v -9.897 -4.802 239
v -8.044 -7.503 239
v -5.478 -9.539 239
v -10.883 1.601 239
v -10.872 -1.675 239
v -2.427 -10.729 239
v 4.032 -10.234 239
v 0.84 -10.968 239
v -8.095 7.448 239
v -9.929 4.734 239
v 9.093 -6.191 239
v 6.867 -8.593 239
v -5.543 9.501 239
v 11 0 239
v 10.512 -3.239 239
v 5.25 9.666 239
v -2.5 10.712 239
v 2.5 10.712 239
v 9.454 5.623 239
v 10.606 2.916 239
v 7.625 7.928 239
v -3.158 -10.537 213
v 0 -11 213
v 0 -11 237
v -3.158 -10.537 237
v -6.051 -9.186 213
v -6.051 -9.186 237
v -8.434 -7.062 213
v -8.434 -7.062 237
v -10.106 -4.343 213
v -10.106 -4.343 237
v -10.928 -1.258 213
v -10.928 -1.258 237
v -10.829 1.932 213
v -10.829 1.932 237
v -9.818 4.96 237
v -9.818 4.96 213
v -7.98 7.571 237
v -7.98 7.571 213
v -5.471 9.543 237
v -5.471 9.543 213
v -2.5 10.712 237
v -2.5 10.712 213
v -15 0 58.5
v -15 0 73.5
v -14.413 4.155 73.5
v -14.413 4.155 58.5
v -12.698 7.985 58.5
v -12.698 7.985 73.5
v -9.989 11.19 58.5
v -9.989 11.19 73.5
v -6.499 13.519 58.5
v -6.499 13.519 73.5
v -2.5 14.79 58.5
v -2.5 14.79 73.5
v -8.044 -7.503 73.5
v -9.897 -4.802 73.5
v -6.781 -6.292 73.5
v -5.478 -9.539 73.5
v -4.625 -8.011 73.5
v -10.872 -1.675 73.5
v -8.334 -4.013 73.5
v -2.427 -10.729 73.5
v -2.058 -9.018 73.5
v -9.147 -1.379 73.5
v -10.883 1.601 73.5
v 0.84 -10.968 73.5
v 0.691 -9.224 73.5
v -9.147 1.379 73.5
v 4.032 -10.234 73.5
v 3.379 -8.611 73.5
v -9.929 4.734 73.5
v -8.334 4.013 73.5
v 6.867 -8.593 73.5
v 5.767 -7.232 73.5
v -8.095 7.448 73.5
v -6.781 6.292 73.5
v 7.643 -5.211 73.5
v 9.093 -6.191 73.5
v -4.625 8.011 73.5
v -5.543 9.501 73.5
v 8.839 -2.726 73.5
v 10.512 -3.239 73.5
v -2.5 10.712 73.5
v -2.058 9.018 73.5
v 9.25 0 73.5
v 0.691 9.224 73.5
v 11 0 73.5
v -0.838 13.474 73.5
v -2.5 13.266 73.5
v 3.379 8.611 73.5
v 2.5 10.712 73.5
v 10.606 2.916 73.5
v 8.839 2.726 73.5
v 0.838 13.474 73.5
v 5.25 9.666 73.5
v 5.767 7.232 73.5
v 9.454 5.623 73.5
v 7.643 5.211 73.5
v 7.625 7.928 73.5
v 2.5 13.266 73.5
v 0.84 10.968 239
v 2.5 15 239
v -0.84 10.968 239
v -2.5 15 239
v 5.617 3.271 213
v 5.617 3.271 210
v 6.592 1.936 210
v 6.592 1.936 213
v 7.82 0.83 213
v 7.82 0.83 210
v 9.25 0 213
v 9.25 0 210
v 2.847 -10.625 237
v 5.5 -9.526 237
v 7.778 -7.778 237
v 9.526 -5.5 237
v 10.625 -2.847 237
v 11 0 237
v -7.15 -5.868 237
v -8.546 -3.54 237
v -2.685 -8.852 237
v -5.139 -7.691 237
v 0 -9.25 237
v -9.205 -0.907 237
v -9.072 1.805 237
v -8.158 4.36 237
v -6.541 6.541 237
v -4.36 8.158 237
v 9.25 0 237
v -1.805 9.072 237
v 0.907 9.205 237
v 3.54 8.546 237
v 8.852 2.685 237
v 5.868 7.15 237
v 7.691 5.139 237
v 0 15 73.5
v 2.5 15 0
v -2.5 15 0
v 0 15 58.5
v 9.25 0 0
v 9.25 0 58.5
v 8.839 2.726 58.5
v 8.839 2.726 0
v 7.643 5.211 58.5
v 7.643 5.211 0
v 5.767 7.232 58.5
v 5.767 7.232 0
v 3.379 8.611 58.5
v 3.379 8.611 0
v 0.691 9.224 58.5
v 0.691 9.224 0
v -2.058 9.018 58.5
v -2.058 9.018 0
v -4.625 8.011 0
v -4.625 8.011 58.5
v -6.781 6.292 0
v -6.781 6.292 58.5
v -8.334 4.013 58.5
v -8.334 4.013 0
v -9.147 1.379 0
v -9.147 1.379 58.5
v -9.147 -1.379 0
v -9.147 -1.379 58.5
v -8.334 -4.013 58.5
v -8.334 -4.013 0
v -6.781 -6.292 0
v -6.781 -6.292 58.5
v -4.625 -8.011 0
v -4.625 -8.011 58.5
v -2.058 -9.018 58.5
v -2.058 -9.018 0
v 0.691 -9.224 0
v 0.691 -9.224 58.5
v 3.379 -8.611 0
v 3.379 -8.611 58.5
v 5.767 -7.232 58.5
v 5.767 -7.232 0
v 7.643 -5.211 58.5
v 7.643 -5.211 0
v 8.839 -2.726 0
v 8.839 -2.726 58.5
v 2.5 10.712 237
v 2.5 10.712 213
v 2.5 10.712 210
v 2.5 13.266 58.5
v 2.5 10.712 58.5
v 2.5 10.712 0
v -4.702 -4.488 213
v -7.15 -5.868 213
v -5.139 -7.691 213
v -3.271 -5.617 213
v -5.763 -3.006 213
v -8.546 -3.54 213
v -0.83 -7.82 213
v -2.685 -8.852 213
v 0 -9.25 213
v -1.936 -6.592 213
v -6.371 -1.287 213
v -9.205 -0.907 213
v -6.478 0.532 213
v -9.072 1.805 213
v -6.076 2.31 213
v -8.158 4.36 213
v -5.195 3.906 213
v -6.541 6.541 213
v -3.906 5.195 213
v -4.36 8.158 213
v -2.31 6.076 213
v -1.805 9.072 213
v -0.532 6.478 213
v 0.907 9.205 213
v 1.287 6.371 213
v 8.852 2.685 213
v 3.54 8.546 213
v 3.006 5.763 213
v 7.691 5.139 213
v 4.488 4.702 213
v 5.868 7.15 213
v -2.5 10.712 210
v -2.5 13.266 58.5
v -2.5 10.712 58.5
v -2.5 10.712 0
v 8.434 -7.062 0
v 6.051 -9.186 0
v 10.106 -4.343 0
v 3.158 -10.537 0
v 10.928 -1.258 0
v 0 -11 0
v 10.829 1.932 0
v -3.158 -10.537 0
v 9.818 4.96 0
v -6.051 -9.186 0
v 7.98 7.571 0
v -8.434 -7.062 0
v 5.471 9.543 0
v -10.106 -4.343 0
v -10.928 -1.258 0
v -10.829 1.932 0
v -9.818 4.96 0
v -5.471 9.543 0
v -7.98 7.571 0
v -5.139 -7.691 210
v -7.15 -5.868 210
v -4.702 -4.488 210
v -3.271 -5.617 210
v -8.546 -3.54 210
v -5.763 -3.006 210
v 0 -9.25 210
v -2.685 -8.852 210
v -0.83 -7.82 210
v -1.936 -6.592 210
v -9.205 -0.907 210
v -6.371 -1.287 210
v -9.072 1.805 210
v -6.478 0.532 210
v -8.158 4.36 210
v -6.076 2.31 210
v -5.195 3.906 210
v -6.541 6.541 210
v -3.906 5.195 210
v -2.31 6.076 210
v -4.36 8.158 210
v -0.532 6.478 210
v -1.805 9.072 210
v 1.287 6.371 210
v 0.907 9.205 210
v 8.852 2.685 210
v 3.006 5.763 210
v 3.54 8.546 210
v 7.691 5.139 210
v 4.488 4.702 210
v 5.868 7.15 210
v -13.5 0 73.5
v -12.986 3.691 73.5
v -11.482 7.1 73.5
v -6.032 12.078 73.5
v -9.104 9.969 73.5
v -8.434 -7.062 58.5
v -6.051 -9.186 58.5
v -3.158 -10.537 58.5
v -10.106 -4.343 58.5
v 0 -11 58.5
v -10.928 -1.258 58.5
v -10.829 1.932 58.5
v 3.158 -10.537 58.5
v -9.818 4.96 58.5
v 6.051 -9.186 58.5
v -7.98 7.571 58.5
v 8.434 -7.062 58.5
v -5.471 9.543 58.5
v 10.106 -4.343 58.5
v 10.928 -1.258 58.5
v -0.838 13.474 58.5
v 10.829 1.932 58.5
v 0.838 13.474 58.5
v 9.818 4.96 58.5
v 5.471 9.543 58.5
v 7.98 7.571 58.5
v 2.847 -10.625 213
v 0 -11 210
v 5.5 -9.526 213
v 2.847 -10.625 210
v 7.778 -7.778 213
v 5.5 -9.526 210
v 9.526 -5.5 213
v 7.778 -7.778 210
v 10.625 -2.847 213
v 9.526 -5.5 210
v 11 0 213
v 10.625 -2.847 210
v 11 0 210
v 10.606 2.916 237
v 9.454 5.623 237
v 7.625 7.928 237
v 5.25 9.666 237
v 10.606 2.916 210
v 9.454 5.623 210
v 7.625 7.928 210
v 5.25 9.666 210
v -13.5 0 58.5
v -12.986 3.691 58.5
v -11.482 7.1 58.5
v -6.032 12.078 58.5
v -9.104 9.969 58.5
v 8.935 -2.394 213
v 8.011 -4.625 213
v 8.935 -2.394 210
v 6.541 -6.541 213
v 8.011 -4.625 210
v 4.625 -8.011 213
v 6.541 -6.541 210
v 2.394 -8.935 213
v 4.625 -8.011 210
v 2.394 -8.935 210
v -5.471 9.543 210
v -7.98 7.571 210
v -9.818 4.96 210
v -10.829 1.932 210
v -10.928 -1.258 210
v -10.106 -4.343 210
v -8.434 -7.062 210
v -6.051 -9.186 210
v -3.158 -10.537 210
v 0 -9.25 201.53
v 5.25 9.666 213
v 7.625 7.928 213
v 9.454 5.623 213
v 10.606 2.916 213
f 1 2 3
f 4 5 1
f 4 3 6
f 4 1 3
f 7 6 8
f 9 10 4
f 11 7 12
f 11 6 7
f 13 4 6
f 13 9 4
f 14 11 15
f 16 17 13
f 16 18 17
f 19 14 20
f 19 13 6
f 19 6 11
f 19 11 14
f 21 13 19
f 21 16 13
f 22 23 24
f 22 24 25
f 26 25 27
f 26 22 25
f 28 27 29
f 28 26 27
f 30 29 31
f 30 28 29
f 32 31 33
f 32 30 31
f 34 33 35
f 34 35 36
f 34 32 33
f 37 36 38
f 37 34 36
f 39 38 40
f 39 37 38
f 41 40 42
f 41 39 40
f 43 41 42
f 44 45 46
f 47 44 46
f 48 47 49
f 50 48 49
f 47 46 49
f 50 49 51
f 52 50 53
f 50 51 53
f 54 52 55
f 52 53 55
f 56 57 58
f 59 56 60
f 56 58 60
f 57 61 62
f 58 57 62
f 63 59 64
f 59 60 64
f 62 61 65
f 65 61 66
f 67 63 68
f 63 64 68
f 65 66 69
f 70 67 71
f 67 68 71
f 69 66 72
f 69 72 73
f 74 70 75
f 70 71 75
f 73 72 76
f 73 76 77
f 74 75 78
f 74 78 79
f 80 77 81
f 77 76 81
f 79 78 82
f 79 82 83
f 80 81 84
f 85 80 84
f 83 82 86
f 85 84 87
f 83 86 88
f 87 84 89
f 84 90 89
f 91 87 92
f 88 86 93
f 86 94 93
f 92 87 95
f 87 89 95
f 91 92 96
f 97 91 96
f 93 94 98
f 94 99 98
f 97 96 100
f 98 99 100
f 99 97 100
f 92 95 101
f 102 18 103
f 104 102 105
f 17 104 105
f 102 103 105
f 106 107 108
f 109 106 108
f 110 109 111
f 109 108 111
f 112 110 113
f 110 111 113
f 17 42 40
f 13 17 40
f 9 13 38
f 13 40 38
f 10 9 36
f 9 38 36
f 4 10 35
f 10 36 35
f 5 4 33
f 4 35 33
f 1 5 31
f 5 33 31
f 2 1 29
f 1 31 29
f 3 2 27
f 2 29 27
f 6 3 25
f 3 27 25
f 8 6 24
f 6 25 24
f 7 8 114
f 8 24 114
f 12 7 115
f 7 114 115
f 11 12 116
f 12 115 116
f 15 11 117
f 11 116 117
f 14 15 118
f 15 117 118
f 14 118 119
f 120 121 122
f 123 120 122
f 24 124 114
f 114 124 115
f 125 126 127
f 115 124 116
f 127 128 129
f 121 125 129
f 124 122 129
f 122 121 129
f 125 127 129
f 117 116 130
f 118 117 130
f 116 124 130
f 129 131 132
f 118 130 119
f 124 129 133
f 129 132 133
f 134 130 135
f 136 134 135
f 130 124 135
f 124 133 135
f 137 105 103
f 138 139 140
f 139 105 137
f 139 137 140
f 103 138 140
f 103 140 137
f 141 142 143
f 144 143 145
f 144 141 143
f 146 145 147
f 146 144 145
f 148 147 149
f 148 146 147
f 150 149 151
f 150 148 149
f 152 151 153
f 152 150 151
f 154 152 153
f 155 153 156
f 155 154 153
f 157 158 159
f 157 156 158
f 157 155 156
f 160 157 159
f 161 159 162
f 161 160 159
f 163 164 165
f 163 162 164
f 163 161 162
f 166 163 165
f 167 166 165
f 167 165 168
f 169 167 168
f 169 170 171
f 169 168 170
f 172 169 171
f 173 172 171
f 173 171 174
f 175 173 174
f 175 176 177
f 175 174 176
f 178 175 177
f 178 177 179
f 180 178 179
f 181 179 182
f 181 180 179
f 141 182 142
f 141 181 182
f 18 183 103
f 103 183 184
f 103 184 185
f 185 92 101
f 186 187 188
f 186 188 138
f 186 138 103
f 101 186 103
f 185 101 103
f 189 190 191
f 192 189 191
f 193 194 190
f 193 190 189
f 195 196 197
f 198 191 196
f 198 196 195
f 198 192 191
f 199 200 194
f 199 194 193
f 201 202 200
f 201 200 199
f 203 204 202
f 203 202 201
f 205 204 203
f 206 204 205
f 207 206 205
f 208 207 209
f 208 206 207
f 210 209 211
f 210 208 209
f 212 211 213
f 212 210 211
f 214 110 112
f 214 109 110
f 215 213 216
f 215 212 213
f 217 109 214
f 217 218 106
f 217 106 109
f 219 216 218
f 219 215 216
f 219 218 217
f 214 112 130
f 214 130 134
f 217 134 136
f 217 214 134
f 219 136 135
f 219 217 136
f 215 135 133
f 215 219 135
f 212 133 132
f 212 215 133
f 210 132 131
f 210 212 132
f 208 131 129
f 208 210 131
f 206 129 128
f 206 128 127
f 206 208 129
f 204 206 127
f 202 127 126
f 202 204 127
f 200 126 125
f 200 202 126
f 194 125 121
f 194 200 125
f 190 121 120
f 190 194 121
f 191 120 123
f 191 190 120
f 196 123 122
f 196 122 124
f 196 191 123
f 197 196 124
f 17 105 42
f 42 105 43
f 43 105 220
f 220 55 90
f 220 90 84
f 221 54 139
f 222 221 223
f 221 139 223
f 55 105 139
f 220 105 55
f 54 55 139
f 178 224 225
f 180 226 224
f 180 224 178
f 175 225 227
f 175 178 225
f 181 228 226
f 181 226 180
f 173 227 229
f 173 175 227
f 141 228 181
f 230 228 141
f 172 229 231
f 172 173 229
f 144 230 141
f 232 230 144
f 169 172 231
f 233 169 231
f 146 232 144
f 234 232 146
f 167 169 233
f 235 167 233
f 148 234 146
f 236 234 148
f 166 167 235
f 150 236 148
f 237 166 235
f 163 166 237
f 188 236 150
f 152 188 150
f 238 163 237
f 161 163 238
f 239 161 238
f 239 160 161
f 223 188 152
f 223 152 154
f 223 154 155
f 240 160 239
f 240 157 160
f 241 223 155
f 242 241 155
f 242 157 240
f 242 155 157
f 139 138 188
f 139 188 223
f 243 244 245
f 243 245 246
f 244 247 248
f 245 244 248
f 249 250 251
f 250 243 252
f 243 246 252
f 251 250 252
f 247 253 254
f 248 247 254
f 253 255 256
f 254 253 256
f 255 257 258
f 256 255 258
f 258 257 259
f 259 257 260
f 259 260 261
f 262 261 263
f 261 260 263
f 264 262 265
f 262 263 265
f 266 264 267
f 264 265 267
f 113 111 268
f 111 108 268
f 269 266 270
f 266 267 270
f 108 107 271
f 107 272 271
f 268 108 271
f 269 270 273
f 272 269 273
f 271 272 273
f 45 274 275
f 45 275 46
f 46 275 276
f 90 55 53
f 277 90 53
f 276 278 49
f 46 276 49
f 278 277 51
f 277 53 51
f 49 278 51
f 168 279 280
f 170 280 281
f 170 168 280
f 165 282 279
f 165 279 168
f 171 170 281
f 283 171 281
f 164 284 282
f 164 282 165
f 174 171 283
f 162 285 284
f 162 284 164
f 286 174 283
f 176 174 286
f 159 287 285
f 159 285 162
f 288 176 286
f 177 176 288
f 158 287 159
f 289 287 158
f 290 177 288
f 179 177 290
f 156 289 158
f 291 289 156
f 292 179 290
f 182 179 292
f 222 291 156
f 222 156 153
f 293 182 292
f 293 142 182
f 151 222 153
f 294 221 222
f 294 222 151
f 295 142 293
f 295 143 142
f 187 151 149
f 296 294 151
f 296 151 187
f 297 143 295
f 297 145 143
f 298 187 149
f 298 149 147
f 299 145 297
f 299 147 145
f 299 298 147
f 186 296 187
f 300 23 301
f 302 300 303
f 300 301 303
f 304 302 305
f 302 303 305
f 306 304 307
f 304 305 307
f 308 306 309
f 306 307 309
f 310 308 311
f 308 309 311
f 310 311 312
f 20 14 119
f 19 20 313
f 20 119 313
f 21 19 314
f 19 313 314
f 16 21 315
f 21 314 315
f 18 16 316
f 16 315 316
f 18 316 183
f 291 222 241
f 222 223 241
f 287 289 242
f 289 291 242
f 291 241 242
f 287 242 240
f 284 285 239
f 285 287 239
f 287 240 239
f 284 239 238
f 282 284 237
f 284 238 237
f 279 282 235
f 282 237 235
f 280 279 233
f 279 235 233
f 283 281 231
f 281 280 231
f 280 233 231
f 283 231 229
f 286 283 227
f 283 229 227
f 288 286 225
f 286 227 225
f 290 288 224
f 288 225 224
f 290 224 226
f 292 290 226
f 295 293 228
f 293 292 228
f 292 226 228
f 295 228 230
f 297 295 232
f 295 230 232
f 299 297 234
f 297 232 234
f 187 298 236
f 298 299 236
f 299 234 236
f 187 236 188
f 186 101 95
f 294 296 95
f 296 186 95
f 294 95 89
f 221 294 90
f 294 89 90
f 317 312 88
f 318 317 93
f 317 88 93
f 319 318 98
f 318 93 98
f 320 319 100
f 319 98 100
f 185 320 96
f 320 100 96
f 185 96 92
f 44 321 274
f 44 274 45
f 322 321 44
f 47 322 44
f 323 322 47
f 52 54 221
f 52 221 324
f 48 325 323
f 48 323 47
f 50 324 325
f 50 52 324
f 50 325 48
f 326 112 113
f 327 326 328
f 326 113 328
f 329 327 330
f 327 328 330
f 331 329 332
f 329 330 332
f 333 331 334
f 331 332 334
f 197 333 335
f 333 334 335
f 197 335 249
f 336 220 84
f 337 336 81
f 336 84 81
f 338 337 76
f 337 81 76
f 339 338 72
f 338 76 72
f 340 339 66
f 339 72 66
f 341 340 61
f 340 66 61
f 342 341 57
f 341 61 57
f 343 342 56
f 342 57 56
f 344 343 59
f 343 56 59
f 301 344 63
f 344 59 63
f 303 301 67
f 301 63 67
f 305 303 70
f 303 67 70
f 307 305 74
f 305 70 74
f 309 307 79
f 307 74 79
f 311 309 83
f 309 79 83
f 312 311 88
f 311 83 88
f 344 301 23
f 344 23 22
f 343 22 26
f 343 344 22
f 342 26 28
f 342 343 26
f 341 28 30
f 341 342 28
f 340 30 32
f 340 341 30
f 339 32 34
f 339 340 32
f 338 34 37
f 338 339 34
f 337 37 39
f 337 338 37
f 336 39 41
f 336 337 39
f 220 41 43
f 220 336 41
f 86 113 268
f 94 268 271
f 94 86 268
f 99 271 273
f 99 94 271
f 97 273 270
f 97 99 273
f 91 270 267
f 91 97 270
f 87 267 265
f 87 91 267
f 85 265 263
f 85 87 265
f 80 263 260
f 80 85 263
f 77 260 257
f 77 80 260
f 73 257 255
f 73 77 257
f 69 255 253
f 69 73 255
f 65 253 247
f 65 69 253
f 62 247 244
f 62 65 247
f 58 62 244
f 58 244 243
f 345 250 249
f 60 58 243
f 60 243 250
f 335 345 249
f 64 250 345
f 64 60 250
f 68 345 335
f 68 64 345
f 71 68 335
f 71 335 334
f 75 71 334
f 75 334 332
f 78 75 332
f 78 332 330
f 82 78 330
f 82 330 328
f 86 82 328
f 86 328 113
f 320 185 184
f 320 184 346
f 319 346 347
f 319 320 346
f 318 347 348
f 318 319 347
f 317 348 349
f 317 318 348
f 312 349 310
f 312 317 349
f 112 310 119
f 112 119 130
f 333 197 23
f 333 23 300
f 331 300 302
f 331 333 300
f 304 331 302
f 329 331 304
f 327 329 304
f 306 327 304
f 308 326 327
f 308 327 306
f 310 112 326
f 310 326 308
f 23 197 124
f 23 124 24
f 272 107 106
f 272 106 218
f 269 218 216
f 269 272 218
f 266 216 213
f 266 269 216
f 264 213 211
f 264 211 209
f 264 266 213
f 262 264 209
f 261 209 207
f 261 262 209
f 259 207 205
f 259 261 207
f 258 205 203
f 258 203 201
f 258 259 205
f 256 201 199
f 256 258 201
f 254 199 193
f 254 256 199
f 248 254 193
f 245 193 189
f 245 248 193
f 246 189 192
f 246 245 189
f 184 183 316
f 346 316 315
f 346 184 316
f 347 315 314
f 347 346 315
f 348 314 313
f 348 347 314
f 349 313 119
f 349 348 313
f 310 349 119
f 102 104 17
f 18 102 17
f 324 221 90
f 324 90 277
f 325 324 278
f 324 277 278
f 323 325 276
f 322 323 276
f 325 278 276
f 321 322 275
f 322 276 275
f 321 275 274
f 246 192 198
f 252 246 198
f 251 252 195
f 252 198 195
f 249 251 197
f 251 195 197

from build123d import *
from build123d.topology import SkipClean

# Parameters (mm, degrees)
SCHIZZO1_R                  = 11
SCHIZZO1_R_2                = 9.25
TUBO_DEPTH                  = 210
INGRESSOCAVI_DEPTH          = 27
SCHIZZO4_R                  = 11
SCHIZZO4_R_2                = 6.5
FONDOCORSA_DEPTH            = 3
SCHIZZO5_R                  = 11
TAPPO_DEPTH                 = 2
BASEINFERIORE_DEPTH         = 239
SCHIZZO7_R                  = 13.5
TAGLIOANELLO_DEPTH          = 15
SUPPORTOANELLO_DEPTH        = 15
FACILITAZIONECAVI_DEPTH     = 3
RACCORDOFACILITAZIONECAVI_R = 8


with BuildPart() as part:
    # Schizzo1 → Tubo (new body)
    with BuildSketch(Plane.XY):
        Circle(SCHIZZO1_R)
        Circle(SCHIZZO1_R_2, mode=Mode.SUBTRACT)
    extrude(amount=TUBO_DEPTH)

    # Schizzo2 → IngressoCavi (add)
    with BuildSketch(Plane.XY.offset(210)):
        with BuildLine():
            Line((0, -9.25), (0, -11))
            ThreePointArc((0, -11), (-7.778174593, 7.778174593), (11, 0))
            Line((11, 0), (9.25, 0))
            ThreePointArc((9.25, 0), (-6.540737726, 6.540737726), (0, -9.25))
        make_face()
    extrude(amount=INGRESSOCAVI_DEPTH)

    # Schizzo4 → FondoCorsa (add)
    with SkipClean():  # the faces are left unmerged after this step: merging them gives an invalid solid
        with BuildSketch(Plane.XY.offset(210)):
            Circle(SCHIZZO4_R)
            Circle(SCHIZZO4_R_2, mode=Mode.SUBTRACT)
        extrude(amount=FONDOCORSA_DEPTH)

    # Schizzo5 → Tappo (add)
    with SkipClean():  # the faces are left unmerged after this step: merging them gives an invalid solid
        with BuildSketch(Plane.XY.offset(237)):
            Circle(SCHIZZO5_R)
        extrude(amount=TAPPO_DEPTH)
    add(part.part.scale(1), mode=Mode.REPLACE)  # the faces are merged on a copy

    # Schizzo6 → BaseInferiore (add)
    with BuildSketch(Plane.XY):
        Polygon((-2.5, 11), (-2.5, 15), (2.5, 15), (2.5, 11), (2.5, 10.712142643), (-2.5, 10.712142643), align=None)
    extrude(amount=BASEINFERIORE_DEPTH)

    # Schizzo7 → TaglioAnello (cut)
    with BuildSketch(Plane.XY.offset(73.5)):
        Circle(SCHIZZO7_R)
    extrude(amount=-TAGLIOANELLO_DEPTH, mode=Mode.SUBTRACT)

    # Schizzo8 → SupportoAnello (add)
    with BuildSketch(Plane.XY.offset(73.5)):
        with BuildLine():
            Line((0, 15), (0, 13.5))
            ThreePointArc((0, 13.5), (-9.545941546, 9.545941546), (-13.5, 0))
            Line((-13.5, 0), (-15, 0))
            ThreePointArc((-15, 0), (-10.606601718, 10.606601718), (0, 15))
        make_face()
    extrude(amount=-SUPPORTOANELLO_DEPTH)

    # Schizzo9 → FacilitazioneCavi (cut)
    with BuildSketch(Plane(origin=(0, 0, 210), x_dir=(-1, 0, 0), z_dir=(0, 0, -1))):
        with BuildLine():
            Line((0, -9.25), (0, 0))
            Line((0, 0), (-9.25, 0))
            ThreePointArc((-9.25, 0), (-6.540737726, -6.540737726), (0, -9.25))
        make_face()
    extrude(amount=-FACILITAZIONECAVI_DEPTH, mode=Mode.SUBTRACT)

    # RaccordoFacilitazioneCavi
    # the kernel refuses this fillet: 8 mm, written as the material it takes off along each edge
    with BuildSketch(Plane(origin=(6.5, 0, 201.530207244), x_dir=(1, 0, 0), z_dir=(0, 0, 1)), Plane(origin=(0, -6.5, 221.469792756), x_dir=(0, -1, 0), z_dir=(0, 0, -1))) as raccordofacilitazionecavi_piece_1:
        with BuildLine():
            CenterArc((6.030405405, 7.296501927), RACCORDOFACILITAZIONECAVI_R, 210.212403153, 35.579578639)
            Line((-0.882921715, 3.270845692), (-1.021188257, 3.190332567))
            ThreePointArc((-1.021188257, 3.190332567), (-0.379082322, 1.65226111), (-0.16, 0))
            Line((-0.16, 0), (0, -0.16))
            ThreePointArc((0, -0.16), (1.375, -0.16), (2.684391892, -0.145930039))
            Line((2.684391892, -0.145930039), (2.75, 0))
        make_face()
    extrude(amount=19.939585512, mode=Mode.SUBTRACT)


solid = part.part
